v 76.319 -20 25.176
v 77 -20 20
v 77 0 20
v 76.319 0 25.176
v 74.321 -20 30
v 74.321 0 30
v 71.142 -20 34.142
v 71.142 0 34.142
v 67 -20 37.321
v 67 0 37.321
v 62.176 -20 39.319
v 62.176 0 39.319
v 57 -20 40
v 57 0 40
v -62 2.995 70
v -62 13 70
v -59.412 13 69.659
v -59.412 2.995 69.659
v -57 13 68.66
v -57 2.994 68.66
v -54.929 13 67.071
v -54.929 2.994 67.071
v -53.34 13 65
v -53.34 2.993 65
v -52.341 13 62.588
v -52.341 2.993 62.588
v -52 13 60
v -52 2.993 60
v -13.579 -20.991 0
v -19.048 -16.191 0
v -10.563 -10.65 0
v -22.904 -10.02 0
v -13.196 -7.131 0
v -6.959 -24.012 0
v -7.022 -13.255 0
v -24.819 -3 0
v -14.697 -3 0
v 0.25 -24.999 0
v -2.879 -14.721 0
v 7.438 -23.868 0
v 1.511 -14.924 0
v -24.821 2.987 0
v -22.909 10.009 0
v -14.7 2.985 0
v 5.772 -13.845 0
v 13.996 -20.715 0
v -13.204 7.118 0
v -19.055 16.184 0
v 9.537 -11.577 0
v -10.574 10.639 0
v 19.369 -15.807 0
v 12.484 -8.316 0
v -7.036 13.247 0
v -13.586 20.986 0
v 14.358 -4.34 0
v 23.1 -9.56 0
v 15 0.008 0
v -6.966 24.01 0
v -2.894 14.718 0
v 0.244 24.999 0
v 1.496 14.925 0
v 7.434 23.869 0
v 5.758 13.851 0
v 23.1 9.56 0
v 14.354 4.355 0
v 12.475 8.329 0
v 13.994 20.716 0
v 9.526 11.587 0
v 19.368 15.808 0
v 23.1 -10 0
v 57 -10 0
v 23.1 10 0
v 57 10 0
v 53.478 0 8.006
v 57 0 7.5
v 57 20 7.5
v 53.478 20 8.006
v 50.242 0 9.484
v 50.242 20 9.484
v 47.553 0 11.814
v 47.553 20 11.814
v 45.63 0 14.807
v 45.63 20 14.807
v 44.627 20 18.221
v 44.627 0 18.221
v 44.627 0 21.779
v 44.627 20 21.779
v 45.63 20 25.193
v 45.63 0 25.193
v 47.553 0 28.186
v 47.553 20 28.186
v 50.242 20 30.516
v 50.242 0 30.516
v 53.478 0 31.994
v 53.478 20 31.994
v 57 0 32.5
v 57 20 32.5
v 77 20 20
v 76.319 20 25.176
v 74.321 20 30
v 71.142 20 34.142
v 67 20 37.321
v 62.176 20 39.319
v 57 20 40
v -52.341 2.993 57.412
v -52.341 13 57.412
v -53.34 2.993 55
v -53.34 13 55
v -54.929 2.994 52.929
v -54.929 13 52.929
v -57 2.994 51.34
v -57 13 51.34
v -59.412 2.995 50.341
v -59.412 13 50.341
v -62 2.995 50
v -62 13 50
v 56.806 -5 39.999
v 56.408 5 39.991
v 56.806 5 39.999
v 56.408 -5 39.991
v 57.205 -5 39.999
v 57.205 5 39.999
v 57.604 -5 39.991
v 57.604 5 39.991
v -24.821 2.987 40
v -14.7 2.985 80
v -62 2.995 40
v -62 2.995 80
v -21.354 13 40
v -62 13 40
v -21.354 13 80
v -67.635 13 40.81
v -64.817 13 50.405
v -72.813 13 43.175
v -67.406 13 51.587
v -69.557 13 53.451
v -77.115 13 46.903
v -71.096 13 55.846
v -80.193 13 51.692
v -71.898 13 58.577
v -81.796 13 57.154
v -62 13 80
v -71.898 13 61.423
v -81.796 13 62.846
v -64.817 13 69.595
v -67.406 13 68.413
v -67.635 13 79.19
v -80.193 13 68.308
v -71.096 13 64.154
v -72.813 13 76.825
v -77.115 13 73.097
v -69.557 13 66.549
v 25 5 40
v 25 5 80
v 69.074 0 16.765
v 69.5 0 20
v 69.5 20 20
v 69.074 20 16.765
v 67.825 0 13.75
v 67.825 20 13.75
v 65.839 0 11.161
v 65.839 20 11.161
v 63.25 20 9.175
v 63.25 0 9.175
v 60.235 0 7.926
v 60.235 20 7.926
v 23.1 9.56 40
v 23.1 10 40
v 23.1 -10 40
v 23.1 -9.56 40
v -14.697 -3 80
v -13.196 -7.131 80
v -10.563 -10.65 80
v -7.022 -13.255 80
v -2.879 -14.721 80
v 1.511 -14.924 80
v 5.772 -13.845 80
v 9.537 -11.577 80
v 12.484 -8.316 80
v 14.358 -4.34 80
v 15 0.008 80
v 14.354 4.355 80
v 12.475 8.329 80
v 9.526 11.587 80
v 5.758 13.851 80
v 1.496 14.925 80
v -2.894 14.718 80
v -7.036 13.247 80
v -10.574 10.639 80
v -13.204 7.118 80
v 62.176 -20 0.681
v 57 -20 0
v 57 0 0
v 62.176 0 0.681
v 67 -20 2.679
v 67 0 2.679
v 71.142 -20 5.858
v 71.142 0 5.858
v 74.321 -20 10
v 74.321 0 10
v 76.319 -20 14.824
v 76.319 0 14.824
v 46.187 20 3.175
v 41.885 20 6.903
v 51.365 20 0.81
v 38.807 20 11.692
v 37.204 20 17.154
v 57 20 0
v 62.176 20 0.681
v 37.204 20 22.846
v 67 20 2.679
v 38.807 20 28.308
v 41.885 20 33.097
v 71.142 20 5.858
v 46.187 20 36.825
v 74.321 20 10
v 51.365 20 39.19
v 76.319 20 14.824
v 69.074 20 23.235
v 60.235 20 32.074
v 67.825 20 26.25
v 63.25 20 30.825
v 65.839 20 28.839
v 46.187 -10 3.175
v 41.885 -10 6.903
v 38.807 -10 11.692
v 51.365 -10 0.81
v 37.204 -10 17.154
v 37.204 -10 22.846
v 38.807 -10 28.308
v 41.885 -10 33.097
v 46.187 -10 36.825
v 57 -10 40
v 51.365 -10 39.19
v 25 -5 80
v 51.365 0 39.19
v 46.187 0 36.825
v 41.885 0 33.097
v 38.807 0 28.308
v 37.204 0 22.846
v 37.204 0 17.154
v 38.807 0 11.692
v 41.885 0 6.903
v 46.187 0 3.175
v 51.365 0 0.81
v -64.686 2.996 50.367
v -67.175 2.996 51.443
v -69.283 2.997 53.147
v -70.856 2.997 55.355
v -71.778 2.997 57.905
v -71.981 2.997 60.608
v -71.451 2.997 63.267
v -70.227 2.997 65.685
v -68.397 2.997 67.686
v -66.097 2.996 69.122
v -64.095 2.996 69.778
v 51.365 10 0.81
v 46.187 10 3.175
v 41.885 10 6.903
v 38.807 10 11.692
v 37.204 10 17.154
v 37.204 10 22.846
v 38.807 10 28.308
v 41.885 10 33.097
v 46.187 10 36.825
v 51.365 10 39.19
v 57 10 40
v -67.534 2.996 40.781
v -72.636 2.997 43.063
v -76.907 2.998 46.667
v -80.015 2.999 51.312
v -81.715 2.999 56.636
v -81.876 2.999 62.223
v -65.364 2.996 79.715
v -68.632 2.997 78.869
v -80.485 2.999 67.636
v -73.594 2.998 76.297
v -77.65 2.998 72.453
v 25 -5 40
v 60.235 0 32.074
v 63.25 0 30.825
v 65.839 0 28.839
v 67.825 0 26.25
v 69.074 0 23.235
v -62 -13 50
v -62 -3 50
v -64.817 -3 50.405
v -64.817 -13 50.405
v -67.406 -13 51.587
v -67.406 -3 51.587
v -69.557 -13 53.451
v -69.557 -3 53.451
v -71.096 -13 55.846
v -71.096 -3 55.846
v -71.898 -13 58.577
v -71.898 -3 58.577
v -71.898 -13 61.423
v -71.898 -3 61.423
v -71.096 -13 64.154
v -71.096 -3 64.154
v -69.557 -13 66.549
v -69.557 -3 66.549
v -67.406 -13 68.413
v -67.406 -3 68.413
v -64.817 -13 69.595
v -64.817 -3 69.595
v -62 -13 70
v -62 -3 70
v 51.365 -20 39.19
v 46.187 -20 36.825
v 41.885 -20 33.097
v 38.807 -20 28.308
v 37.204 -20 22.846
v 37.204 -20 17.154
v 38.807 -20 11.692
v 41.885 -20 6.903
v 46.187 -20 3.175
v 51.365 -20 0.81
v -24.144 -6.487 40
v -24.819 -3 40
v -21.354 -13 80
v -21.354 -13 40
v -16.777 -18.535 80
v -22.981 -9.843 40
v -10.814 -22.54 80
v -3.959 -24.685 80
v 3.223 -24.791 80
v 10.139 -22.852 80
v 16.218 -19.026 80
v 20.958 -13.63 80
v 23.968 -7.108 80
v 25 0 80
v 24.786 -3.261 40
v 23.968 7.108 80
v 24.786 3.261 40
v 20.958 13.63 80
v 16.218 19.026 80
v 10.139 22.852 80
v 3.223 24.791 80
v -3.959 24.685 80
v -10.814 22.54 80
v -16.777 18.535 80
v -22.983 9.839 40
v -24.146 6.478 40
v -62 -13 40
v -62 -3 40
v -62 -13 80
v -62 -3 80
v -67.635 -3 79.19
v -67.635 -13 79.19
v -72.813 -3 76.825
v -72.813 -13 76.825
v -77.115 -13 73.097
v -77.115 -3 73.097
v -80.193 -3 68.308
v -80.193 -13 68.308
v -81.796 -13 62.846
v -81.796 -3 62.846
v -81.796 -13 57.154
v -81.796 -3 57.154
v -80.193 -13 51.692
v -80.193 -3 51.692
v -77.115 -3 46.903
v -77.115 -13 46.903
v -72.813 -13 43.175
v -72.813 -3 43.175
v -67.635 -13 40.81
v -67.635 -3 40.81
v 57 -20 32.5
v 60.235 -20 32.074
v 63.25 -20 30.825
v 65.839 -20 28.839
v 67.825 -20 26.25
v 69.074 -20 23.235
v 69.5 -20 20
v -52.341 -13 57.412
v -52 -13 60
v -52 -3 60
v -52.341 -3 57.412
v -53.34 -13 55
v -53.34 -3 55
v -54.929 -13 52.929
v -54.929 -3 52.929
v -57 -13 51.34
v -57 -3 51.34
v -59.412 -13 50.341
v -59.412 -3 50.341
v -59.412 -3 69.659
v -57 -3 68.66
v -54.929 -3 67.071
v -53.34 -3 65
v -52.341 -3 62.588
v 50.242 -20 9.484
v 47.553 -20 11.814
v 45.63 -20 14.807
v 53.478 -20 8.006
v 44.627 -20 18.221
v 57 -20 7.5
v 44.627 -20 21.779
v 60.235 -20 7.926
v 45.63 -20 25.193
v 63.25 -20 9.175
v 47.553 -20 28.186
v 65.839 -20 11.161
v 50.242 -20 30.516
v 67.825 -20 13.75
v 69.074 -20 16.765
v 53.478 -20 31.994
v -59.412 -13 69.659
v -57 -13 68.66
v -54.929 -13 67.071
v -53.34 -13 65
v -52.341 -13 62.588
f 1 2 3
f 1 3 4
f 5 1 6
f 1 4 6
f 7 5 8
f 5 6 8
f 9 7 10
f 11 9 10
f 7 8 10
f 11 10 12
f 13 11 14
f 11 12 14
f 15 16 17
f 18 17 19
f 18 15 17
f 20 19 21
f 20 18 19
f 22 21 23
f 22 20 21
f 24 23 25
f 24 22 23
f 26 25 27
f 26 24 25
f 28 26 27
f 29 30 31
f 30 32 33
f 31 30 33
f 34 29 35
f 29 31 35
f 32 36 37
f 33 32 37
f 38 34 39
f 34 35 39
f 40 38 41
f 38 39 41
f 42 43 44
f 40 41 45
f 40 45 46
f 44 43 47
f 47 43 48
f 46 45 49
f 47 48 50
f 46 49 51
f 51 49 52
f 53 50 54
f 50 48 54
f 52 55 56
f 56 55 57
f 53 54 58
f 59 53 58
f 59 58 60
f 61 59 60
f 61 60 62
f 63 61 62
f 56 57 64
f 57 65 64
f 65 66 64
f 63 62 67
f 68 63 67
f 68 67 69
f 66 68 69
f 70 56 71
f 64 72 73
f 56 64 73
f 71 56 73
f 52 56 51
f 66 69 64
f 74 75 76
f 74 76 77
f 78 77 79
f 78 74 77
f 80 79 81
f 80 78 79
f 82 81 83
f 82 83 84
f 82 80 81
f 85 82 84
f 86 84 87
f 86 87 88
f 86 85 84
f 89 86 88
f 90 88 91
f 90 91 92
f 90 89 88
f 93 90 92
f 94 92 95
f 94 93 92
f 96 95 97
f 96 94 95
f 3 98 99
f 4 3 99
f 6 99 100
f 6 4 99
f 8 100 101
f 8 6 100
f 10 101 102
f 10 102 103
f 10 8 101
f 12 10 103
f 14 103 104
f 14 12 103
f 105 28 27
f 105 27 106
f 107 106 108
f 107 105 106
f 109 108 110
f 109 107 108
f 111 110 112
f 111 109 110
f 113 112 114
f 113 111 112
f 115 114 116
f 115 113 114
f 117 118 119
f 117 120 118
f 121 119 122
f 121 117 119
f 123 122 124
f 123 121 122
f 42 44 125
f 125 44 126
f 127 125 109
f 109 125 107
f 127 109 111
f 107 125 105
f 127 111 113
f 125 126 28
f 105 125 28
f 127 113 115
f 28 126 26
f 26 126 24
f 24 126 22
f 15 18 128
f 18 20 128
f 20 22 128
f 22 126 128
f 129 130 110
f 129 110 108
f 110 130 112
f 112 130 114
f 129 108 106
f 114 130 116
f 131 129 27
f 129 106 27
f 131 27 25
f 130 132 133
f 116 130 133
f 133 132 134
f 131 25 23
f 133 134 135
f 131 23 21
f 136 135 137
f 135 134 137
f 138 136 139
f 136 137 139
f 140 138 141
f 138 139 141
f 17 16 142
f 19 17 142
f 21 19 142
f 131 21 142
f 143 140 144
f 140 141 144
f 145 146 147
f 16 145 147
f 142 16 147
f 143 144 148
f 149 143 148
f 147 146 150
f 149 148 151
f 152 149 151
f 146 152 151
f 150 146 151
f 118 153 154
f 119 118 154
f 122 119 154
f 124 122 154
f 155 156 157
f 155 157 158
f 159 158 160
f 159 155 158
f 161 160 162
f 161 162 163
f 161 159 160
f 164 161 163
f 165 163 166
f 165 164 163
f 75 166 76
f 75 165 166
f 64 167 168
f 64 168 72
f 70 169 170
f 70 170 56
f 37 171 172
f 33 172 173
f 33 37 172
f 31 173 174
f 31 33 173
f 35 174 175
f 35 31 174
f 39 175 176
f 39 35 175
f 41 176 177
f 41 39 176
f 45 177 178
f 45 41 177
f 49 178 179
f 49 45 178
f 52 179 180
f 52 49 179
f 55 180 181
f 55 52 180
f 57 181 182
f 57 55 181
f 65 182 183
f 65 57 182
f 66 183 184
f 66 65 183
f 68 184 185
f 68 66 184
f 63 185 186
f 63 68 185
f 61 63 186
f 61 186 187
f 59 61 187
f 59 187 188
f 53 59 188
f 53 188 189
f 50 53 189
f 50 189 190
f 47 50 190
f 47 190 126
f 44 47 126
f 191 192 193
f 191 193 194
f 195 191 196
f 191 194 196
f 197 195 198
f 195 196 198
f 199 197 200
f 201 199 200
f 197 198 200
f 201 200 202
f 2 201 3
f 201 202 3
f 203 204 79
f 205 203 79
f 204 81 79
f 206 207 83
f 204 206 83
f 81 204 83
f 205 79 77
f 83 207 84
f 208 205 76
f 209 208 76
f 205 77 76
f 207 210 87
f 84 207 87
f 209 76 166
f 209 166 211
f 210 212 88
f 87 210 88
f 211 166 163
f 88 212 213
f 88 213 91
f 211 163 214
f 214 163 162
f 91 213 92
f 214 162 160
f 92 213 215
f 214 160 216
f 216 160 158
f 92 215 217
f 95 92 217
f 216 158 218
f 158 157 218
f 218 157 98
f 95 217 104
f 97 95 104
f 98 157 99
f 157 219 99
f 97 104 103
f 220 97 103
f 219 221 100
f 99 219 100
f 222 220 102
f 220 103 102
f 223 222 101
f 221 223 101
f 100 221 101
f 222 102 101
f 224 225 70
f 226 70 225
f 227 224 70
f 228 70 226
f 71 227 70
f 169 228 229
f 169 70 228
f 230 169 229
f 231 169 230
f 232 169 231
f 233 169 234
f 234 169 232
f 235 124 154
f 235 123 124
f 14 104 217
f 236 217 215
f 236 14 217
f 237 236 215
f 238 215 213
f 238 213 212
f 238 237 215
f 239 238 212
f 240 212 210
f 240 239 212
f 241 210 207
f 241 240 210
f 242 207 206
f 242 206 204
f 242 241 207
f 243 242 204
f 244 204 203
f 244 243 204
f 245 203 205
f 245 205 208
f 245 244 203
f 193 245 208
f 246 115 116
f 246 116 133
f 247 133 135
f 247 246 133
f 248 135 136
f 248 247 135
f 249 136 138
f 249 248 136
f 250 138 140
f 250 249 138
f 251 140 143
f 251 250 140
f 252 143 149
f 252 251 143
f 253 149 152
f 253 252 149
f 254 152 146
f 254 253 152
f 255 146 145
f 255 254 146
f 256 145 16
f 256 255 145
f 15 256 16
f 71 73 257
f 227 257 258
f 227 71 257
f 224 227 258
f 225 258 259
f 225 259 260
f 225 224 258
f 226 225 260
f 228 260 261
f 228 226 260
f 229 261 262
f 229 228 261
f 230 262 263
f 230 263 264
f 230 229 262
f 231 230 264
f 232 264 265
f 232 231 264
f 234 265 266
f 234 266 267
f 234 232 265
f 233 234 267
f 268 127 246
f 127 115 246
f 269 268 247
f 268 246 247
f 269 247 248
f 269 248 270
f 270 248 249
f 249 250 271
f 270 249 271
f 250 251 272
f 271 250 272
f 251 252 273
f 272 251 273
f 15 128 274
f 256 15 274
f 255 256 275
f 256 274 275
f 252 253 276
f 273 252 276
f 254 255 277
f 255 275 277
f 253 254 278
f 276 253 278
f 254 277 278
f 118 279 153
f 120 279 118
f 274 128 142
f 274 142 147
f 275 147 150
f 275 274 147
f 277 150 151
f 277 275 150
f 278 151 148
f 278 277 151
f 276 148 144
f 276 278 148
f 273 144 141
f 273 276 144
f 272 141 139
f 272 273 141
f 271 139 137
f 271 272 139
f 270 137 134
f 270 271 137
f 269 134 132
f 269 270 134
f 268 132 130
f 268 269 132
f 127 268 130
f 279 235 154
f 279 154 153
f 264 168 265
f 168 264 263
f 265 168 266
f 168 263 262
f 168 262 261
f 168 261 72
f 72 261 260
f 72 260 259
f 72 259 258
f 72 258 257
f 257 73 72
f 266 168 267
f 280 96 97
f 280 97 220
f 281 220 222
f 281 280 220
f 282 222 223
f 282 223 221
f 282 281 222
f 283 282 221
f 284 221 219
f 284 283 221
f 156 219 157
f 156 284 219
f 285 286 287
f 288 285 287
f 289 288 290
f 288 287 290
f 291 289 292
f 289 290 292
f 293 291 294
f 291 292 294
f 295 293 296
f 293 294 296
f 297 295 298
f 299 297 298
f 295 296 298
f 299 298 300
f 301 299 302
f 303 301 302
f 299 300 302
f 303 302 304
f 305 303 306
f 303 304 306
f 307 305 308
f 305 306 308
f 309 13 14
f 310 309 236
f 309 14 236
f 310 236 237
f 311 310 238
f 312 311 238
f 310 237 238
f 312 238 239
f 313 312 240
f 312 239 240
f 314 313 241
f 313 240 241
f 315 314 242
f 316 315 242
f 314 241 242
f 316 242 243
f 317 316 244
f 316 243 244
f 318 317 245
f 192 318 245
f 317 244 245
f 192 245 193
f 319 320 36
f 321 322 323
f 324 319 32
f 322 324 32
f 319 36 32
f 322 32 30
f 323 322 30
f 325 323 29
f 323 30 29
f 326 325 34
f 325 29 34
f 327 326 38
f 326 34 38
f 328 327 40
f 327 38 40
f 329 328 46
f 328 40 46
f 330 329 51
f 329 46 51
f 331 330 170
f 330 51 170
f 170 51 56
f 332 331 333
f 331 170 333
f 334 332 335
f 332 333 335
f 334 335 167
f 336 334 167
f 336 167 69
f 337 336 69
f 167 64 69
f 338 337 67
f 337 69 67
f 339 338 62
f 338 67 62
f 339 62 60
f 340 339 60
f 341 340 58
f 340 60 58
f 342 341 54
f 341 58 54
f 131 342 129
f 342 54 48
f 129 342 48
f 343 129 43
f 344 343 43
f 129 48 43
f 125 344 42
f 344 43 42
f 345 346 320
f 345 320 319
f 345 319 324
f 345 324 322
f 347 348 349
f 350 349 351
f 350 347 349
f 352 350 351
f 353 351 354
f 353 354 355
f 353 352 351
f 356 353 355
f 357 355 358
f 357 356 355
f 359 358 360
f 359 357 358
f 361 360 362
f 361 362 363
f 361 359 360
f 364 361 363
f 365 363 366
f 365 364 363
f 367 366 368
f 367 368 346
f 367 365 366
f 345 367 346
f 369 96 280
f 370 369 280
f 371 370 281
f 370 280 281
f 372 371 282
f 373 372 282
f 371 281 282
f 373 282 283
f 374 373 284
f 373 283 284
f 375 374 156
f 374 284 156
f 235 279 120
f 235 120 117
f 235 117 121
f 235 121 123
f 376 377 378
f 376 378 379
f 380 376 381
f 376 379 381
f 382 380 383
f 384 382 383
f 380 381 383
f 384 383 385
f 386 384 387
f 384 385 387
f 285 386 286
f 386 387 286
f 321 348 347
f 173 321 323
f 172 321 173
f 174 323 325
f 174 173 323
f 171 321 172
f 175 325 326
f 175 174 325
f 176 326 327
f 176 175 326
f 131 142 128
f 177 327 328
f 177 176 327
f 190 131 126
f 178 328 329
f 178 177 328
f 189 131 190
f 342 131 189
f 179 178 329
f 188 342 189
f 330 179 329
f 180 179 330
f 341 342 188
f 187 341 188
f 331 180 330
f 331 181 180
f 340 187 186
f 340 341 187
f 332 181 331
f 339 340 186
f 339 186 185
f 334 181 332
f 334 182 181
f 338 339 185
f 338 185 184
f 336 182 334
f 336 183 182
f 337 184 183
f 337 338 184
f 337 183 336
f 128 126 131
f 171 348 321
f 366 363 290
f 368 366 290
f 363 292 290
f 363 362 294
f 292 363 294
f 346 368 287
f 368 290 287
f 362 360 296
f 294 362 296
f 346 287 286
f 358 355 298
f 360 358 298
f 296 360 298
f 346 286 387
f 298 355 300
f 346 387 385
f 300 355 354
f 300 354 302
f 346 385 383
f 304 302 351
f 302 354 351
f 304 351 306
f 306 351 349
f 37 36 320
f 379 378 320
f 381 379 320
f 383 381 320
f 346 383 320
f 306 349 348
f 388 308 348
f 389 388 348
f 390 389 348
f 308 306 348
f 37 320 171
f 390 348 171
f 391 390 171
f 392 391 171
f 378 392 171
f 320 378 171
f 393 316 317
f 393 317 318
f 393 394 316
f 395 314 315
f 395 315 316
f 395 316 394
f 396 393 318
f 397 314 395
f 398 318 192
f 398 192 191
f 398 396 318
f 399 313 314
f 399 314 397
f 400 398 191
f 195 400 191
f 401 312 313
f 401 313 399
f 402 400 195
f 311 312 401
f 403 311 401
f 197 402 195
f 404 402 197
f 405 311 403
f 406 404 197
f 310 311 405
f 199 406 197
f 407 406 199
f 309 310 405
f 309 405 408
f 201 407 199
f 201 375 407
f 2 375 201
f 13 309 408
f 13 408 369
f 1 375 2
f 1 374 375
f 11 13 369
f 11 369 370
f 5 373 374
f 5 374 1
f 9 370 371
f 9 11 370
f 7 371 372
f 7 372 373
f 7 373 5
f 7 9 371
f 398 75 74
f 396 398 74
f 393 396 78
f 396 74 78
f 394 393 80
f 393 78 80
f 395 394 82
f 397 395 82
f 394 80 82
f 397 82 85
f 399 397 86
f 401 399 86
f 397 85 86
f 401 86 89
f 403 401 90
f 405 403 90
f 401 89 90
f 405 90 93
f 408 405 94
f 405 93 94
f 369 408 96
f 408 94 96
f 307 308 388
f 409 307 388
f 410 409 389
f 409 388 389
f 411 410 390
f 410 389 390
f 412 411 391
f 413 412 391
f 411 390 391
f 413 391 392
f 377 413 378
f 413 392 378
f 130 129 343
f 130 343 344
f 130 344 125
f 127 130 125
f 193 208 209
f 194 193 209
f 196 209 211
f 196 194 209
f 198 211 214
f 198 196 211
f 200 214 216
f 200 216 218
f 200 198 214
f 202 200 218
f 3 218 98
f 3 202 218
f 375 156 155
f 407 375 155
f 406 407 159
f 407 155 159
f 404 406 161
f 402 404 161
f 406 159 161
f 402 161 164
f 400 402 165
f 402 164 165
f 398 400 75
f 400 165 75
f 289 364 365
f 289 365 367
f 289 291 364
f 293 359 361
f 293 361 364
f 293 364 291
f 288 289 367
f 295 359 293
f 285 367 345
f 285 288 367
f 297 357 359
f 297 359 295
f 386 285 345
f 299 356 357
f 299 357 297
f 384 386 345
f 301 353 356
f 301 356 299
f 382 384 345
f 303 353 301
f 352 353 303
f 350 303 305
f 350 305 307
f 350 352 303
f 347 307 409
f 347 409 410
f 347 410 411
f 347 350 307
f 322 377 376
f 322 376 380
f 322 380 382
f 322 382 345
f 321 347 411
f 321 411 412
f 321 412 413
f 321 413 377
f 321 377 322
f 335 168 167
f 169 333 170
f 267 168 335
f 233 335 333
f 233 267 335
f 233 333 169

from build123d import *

# Parameters (mm, degrees)
F0_R           = 25
F0_R_2         = 15
F1_DEPTH       = 80
F3_DEPTH       = 13
F3_DEPTH_BACK  = 13
F4_DEPTH       = 4.5
F5_W           = 28.1823416352
F5_H           = 3
F6_DEPTH       = 99.3
F8_DEPTH       = 10
F8_DEPTH_BACK  = 10
F9_DEPTH       = 20
F9_DEPTH_BACK  = 20
F10_DEPTH      = 1.9
F12_DEPTH      = 5
F12_DEPTH_BACK = 5


# Not quite as in the source:
# - ends of sketch curves that miss each other by under 0.0002 mm in the source are joined


with BuildPart() as f1:
    # F0 (on Top) → F1 (new body)
    with BuildSketch(Plane.XY):
        Circle(F0_R)
        Circle(F0_R_2, mode=Mode.SUBTRACT)
    extrude(amount=F1_DEPTH)



with BuildPart() as f3:
    # F2 (on Front) → F3 (new body, two sides)
    with BuildSketch(Plane.XZ) as f3_sk:
        with BuildLine():
            Line((-62, 40), (-25, 40))
            Line((-25, 40), (-25, 80))
            Line((-25, 80), (-62, 80))
            ThreePointArc((-62, 80), (-47.8578643763, 74.1421356237), (-42, 60))
            ThreePointArc((-42, 60), (-47.8578643763, 45.8578643763), (-62, 40))
        make_face()
        with BuildLine():
            ThreePointArc((-62, 80), (-82, 60), (-62, 40))
            Line((-62, 40), (-62, 50))
            ThreePointArc((-62, 50), (-72, 60), (-62, 70))
            Line((-62, 70), (-62, 80))
        make_face()
        with BuildLine():
            Line((-62, 50), (-62, 40))
            ThreePointArc((-62, 40), (-47.8578643763, 45.8578643763), (-42, 60))
            ThreePointArc((-42, 60), (-47.8578643763, 74.1421356237), (-62, 80))
            Line((-62, 80), (-62, 70))
            ThreePointArc((-62, 70), (-54.9289321881, 67.0710678119), (-52, 60))
            ThreePointArc((-52, 60), (-54.9289321881, 52.9289321881), (-62, 50))
        make_face()
    extrude(amount=F3_DEPTH)
    extrude(f3_sk.sketch, amount=-F3_DEPTH_BACK)


with BuildPart() as f1_1:
    add(f1.part)
    # F4 (add): a face of the model
    f4_faces = [f3.part.faces().sort_by_distance(p)[0] for p in [
        (-25, 0, 60),
    ]]

    add(f3.part)  # F4 merges F3
    extrude(f4_faces, amount=F4_DEPTH)

    # F5 (on face) → F6 (cut)
    with BuildSketch(Plane.XY.offset(80)):
        Polygon((-90.1823416352, 0), (-62, 0), (-62, 2.9951323172), (-90.1823415071, 3.0011918221), align=None)
        with Locations((-76.0911708176, -1.5)):
            Rectangle(F5_W, F5_H)
        with BuildLine():
            Line((-62, 0), (-15, 0))
            ThreePointArc((-15, 0), (-14.9248115566, 1.5), (-14.7, 2.9849623113))
            Line((-14.7, 2.9849623113), (-62, 2.9951323172))
            Line((-62, 2.9951323172), (-62, 0))
        make_face()
        with BuildLine():
            ThreePointArc((-14.6969384567, -3), (-14.9240422951, -1.5076344301), (-15, 0))
            Line((-15, 0), (-62, 0))
            Line((-62, 0), (-62, -3))
            Line((-62, -3), (-14.6969384567, -3))
        make_face()
    extrude(amount=-F6_DEPTH, mode=Mode.SUBTRACT)



with BuildPart() as f8:
    # F7 (on Front) → F8 (new body, two sides)
    with BuildSketch(Plane.XZ) as f8_sk:
        with BuildLine():
            Line((57, 40), (25, 40))
            Line((25, 40), (25, 0))
            Line((25, 0), (57, 0))
            ThreePointArc((57, 0), (37, 20), (57, 40))
        make_face()
    extrude(amount=F8_DEPTH)
    extrude(f8_sk.sketch, amount=-F8_DEPTH_BACK)


with BuildPart() as f9:
    # F7 (on Front) → F9 (new body, two sides)
    with BuildSketch(Plane.XZ) as f9_sk:
        with BuildLine():
            ThreePointArc((77, 20), (71.1421356237, 34.1421356237), (57, 40))
            Line((57, 40), (57, 32.5))
            ThreePointArc((57, 32.5), (65.8388347648, 28.8388347648), (69.5, 20))
            ThreePointArc((69.5, 20), (65.8388347648, 11.1611652352), (57, 7.5))
            Line((57, 7.5), (57, 0))
            ThreePointArc((57, 0), (71.1421356237, 5.8578643763), (77, 20))
        make_face()
        with BuildLine():
            Line((57, 32.5), (57, 40))
            ThreePointArc((57, 40), (37, 20), (57, 0))
            Line((57, 0), (57, 7.5))
            ThreePointArc((57, 7.5), (44.5, 20), (57, 32.5))
        make_face()
    extrude(amount=F9_DEPTH)
    extrude(f9_sk.sketch, amount=-F9_DEPTH_BACK)


with BuildPart() as f1_2:
    add(f1_1.part)
    # F10 (add): a face of the model
    f10_faces = [f8.part.faces().sort_by_distance(p)[0] for p in [
        (25, 0, 20),
    ]]

    add(f8.part)  # F10 merges F8
    extrude(f10_faces, amount=F10_DEPTH)


with BuildPart() as f12:
    # F11 (on Front) → F12 (new body, two sides)
    with BuildSketch(Plane.XZ) as f12_sk:
        with BuildLine():
            Line((57.6036605042, 39.9908877741), (25, 80))
            Line((25, 80), (25, 40))
            Line((25, 40), (56.4075138858, 39.9912220788))
            ThreePointArc((56.4075138858, 39.9912220788), (57.0055896948, 39.9999992189), (57.6036605042, 39.9908877741))
        make_face()
    extrude(amount=F12_DEPTH)
    extrude(f12_sk.sketch, amount=-F12_DEPTH_BACK)


solid = Compound([f9.part, f1_2.part, f12.part])
